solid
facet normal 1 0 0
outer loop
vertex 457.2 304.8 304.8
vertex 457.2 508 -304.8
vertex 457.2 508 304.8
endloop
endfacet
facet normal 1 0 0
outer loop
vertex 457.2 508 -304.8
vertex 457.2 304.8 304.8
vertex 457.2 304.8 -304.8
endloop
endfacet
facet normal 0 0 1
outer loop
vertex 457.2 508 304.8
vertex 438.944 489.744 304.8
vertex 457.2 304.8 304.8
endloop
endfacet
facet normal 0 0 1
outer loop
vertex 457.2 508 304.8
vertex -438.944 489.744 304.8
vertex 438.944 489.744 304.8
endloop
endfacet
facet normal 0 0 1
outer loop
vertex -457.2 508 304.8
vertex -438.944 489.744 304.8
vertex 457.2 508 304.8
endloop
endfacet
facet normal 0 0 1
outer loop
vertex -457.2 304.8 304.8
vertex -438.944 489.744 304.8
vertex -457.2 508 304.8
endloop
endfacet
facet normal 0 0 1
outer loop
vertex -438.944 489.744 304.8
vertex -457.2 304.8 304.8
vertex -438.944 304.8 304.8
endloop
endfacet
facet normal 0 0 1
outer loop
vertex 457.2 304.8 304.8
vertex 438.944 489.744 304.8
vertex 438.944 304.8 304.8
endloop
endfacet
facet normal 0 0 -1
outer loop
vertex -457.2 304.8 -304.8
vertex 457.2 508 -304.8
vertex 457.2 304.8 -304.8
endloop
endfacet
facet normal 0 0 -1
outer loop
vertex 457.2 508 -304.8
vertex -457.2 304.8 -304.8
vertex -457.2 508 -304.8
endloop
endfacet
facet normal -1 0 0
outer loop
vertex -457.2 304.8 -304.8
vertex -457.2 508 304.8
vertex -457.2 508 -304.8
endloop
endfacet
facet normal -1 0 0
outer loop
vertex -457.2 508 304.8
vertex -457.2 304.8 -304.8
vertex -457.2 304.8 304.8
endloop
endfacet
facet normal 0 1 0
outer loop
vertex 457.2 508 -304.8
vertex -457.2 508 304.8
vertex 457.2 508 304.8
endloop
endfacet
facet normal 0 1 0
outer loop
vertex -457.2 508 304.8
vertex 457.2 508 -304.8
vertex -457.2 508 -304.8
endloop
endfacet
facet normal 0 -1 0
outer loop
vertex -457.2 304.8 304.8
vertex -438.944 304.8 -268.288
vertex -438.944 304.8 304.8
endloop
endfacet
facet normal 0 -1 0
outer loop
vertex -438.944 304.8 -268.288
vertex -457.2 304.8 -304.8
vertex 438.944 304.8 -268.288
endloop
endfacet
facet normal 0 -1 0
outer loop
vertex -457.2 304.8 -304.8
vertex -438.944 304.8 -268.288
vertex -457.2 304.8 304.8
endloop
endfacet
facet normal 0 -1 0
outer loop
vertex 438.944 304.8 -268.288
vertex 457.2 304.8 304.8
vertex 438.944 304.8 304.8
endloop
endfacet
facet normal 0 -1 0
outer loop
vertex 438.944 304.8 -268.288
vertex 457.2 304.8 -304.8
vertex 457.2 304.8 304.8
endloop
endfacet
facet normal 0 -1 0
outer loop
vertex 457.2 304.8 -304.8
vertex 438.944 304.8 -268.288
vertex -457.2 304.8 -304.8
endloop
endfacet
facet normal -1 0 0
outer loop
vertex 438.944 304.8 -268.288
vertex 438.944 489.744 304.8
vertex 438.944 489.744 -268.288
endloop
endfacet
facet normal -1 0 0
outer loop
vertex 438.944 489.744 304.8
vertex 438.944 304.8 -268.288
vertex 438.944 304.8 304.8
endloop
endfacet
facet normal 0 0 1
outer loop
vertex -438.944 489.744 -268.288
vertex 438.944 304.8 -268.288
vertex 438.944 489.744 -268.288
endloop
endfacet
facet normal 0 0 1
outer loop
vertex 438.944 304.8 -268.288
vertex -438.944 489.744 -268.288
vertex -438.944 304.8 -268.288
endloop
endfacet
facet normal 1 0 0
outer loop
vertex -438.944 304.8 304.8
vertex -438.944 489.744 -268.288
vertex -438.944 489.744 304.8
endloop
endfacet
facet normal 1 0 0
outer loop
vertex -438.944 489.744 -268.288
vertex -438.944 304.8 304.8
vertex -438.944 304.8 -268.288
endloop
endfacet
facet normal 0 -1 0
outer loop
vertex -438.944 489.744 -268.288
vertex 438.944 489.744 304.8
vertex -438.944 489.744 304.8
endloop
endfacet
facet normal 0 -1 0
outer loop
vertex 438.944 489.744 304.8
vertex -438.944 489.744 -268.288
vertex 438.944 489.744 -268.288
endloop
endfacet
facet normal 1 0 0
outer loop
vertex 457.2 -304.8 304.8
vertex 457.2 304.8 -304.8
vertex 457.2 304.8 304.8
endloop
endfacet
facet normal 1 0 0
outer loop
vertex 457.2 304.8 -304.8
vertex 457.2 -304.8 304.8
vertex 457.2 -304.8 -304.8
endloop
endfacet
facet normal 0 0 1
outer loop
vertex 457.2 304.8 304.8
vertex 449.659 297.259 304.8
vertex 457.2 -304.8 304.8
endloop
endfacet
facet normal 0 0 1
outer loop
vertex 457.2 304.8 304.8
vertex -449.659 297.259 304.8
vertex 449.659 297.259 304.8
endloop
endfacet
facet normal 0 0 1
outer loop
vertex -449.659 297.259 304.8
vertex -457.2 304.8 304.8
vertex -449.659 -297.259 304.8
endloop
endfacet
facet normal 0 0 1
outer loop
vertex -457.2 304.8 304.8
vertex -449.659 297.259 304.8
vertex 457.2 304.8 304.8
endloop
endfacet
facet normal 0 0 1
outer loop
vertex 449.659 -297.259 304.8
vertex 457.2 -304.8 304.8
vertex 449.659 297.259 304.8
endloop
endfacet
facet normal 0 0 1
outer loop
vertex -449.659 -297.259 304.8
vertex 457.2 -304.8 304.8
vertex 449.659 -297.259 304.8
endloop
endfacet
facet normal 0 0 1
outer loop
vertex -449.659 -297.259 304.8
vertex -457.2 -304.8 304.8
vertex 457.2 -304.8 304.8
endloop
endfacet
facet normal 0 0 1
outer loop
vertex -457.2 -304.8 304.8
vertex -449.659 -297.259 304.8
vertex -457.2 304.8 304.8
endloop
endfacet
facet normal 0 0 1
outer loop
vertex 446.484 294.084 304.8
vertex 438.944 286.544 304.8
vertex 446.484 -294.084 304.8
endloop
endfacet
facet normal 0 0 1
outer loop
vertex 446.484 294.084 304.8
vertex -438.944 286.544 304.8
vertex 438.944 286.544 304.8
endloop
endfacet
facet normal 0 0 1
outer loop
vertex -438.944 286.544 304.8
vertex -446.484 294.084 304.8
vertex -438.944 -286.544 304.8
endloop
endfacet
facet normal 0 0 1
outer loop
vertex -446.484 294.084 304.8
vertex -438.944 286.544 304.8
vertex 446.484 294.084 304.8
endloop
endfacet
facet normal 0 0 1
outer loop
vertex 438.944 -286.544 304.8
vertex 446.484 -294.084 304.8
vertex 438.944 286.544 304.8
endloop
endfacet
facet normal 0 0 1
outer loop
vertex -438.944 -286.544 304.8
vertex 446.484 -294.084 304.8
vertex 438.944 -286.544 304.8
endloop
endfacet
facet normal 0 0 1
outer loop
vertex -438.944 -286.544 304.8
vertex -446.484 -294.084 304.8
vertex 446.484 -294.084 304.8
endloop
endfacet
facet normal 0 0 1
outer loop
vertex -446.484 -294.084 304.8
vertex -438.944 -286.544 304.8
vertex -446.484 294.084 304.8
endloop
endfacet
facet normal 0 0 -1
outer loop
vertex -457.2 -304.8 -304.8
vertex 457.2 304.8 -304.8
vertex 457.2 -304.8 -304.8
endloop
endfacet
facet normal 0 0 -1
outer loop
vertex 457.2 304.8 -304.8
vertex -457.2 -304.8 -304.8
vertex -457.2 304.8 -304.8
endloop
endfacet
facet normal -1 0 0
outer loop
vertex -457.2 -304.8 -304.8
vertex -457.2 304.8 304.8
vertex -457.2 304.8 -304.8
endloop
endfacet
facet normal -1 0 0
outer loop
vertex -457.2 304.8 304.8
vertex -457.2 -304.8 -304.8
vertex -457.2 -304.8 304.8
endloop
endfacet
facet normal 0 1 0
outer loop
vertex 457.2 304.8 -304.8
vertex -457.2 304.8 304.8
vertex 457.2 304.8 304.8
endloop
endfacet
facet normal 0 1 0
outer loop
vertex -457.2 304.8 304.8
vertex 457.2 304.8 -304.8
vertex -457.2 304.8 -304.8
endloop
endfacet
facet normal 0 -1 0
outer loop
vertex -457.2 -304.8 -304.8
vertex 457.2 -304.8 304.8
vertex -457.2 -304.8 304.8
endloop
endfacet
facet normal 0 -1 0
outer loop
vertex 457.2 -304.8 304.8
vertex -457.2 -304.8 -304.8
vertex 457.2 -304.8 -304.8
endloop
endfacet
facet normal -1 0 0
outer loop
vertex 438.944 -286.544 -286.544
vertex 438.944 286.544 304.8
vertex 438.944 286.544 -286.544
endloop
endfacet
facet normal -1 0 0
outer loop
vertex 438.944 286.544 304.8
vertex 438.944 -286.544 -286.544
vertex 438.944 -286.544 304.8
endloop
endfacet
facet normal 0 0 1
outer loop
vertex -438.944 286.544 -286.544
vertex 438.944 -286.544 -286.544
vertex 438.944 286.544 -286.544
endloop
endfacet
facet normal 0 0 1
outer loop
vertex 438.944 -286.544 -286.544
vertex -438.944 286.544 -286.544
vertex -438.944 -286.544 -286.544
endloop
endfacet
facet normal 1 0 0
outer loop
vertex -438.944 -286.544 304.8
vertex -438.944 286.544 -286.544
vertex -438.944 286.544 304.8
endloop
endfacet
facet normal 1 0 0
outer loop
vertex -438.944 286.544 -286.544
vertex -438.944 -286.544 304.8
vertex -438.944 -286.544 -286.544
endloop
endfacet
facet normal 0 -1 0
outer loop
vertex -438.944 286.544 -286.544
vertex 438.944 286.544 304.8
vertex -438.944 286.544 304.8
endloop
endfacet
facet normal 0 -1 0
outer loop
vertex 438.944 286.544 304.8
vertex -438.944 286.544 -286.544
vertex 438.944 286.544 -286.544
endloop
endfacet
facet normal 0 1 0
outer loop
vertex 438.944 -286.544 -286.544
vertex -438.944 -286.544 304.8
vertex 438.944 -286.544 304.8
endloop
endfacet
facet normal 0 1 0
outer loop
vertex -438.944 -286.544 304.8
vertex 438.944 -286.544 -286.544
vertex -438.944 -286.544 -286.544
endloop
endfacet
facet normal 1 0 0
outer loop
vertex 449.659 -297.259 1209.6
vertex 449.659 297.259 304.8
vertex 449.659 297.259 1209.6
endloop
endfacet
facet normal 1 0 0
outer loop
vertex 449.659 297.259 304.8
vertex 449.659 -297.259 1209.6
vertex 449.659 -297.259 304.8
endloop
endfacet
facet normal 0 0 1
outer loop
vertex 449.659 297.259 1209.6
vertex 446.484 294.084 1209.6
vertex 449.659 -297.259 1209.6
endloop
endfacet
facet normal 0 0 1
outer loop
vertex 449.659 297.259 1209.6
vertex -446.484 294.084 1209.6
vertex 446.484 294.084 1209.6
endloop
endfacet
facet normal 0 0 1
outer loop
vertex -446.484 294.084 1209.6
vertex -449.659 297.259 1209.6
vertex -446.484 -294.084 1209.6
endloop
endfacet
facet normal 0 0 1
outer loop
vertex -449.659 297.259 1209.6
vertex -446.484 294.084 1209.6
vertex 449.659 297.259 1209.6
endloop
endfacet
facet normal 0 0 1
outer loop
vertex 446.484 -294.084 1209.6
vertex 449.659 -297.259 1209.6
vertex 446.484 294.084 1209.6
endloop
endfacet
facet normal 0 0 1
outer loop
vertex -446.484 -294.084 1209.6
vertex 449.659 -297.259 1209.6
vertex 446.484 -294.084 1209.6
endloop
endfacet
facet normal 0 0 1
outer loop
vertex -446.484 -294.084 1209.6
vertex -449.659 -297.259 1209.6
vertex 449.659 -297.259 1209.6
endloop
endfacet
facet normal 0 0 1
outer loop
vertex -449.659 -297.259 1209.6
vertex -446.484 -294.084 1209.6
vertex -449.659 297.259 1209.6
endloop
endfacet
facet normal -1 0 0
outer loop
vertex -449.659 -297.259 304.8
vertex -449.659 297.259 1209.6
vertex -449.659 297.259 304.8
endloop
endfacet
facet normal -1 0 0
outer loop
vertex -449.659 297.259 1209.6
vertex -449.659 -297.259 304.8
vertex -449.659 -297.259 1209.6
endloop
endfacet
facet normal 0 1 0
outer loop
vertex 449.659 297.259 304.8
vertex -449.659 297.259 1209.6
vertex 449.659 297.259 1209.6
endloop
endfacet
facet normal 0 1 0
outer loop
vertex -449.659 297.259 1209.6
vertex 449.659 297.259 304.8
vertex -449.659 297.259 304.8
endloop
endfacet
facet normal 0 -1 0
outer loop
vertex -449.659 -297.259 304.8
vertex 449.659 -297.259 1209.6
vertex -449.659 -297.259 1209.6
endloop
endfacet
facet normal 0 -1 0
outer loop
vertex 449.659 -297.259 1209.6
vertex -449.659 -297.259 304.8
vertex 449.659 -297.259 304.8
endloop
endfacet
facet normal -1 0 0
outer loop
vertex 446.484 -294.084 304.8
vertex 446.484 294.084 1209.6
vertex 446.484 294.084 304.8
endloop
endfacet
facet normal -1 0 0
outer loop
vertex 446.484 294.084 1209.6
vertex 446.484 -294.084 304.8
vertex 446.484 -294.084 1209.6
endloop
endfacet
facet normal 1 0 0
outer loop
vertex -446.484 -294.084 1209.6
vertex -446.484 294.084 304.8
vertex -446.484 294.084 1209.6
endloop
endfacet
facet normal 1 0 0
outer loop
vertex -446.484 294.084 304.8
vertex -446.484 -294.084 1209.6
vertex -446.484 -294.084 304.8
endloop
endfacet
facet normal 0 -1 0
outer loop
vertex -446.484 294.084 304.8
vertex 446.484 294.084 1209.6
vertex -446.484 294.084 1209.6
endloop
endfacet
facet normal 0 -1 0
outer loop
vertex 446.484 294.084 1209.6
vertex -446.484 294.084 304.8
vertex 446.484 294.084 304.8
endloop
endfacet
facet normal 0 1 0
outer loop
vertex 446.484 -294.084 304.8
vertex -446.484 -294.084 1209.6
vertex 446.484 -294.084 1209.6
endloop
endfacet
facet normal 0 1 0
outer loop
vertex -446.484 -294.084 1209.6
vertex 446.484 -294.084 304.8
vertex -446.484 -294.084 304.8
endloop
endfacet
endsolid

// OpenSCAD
INCHES = 25.4;
FEET = 304.8;

base_thickness = (23/32)*INCHES; // 3/4" Plywood
base_outer_x = 3*FEET;
base_outer_y = 2*FEET;
base_outer_z = 2*FEET;
base_inner_x = base_outer_x - (2*base_thickness);
base_inner_y = base_outer_y - (2*base_thickness);
base_inner_z = base_outer_z - (2*base_thickness);

glass_thickness = (1/8)*INCHES;
glass_outer_x = base_inner_x + base_thickness + glass_thickness;
glass_outer_y = base_inner_y + base_thickness + glass_thickness;
glass_outer_z = 1200;
glass_inner_x = glass_outer_x - (2*glass_thickness);
glass_inner_y = glass_outer_y - (2*glass_thickness);
glass_inner_z = glass_outer_z - (2*glass_thickness);

side_outer_y = base_outer_y/3;
side_inner_y = side_outer_y - base_thickness;

/* Wood */
color("SaddleBrown", 1)
{
    difference()
    {
        /* Outer Shapes of Objects */
        union() {
            /* Main Box */
            cube([base_outer_x, base_outer_y, base_outer_z], true);
            
            /* Side Box */
            translate([0, (base_outer_y-side_outer_y), 0])
            {
                difference()
                {
                    cube([base_outer_x, side_outer_y, base_outer_z], true);
                    translate([0, -(base_thickness/2), base_thickness])
                    {
                        cube([base_inner_x, side_inner_y, base_inner_z], true);
                    }
                }
            }
        }
        /* Void Spaces of Objects */
        
        translate([0, 0, base_thickness])
        {
            cube([base_inner_x, base_inner_y, base_outer_z], true);
        }
    }
}
/* Glass */
color("LightCyan", 0.5)
{
    translate([0,0,base_outer_z])
    {
        difference()
        {
            cube([glass_outer_x, glass_outer_y, glass_outer_z], true);
            cube([glass_inner_x, glass_inner_y, glass_outer_z], true);
        }
    }
}
